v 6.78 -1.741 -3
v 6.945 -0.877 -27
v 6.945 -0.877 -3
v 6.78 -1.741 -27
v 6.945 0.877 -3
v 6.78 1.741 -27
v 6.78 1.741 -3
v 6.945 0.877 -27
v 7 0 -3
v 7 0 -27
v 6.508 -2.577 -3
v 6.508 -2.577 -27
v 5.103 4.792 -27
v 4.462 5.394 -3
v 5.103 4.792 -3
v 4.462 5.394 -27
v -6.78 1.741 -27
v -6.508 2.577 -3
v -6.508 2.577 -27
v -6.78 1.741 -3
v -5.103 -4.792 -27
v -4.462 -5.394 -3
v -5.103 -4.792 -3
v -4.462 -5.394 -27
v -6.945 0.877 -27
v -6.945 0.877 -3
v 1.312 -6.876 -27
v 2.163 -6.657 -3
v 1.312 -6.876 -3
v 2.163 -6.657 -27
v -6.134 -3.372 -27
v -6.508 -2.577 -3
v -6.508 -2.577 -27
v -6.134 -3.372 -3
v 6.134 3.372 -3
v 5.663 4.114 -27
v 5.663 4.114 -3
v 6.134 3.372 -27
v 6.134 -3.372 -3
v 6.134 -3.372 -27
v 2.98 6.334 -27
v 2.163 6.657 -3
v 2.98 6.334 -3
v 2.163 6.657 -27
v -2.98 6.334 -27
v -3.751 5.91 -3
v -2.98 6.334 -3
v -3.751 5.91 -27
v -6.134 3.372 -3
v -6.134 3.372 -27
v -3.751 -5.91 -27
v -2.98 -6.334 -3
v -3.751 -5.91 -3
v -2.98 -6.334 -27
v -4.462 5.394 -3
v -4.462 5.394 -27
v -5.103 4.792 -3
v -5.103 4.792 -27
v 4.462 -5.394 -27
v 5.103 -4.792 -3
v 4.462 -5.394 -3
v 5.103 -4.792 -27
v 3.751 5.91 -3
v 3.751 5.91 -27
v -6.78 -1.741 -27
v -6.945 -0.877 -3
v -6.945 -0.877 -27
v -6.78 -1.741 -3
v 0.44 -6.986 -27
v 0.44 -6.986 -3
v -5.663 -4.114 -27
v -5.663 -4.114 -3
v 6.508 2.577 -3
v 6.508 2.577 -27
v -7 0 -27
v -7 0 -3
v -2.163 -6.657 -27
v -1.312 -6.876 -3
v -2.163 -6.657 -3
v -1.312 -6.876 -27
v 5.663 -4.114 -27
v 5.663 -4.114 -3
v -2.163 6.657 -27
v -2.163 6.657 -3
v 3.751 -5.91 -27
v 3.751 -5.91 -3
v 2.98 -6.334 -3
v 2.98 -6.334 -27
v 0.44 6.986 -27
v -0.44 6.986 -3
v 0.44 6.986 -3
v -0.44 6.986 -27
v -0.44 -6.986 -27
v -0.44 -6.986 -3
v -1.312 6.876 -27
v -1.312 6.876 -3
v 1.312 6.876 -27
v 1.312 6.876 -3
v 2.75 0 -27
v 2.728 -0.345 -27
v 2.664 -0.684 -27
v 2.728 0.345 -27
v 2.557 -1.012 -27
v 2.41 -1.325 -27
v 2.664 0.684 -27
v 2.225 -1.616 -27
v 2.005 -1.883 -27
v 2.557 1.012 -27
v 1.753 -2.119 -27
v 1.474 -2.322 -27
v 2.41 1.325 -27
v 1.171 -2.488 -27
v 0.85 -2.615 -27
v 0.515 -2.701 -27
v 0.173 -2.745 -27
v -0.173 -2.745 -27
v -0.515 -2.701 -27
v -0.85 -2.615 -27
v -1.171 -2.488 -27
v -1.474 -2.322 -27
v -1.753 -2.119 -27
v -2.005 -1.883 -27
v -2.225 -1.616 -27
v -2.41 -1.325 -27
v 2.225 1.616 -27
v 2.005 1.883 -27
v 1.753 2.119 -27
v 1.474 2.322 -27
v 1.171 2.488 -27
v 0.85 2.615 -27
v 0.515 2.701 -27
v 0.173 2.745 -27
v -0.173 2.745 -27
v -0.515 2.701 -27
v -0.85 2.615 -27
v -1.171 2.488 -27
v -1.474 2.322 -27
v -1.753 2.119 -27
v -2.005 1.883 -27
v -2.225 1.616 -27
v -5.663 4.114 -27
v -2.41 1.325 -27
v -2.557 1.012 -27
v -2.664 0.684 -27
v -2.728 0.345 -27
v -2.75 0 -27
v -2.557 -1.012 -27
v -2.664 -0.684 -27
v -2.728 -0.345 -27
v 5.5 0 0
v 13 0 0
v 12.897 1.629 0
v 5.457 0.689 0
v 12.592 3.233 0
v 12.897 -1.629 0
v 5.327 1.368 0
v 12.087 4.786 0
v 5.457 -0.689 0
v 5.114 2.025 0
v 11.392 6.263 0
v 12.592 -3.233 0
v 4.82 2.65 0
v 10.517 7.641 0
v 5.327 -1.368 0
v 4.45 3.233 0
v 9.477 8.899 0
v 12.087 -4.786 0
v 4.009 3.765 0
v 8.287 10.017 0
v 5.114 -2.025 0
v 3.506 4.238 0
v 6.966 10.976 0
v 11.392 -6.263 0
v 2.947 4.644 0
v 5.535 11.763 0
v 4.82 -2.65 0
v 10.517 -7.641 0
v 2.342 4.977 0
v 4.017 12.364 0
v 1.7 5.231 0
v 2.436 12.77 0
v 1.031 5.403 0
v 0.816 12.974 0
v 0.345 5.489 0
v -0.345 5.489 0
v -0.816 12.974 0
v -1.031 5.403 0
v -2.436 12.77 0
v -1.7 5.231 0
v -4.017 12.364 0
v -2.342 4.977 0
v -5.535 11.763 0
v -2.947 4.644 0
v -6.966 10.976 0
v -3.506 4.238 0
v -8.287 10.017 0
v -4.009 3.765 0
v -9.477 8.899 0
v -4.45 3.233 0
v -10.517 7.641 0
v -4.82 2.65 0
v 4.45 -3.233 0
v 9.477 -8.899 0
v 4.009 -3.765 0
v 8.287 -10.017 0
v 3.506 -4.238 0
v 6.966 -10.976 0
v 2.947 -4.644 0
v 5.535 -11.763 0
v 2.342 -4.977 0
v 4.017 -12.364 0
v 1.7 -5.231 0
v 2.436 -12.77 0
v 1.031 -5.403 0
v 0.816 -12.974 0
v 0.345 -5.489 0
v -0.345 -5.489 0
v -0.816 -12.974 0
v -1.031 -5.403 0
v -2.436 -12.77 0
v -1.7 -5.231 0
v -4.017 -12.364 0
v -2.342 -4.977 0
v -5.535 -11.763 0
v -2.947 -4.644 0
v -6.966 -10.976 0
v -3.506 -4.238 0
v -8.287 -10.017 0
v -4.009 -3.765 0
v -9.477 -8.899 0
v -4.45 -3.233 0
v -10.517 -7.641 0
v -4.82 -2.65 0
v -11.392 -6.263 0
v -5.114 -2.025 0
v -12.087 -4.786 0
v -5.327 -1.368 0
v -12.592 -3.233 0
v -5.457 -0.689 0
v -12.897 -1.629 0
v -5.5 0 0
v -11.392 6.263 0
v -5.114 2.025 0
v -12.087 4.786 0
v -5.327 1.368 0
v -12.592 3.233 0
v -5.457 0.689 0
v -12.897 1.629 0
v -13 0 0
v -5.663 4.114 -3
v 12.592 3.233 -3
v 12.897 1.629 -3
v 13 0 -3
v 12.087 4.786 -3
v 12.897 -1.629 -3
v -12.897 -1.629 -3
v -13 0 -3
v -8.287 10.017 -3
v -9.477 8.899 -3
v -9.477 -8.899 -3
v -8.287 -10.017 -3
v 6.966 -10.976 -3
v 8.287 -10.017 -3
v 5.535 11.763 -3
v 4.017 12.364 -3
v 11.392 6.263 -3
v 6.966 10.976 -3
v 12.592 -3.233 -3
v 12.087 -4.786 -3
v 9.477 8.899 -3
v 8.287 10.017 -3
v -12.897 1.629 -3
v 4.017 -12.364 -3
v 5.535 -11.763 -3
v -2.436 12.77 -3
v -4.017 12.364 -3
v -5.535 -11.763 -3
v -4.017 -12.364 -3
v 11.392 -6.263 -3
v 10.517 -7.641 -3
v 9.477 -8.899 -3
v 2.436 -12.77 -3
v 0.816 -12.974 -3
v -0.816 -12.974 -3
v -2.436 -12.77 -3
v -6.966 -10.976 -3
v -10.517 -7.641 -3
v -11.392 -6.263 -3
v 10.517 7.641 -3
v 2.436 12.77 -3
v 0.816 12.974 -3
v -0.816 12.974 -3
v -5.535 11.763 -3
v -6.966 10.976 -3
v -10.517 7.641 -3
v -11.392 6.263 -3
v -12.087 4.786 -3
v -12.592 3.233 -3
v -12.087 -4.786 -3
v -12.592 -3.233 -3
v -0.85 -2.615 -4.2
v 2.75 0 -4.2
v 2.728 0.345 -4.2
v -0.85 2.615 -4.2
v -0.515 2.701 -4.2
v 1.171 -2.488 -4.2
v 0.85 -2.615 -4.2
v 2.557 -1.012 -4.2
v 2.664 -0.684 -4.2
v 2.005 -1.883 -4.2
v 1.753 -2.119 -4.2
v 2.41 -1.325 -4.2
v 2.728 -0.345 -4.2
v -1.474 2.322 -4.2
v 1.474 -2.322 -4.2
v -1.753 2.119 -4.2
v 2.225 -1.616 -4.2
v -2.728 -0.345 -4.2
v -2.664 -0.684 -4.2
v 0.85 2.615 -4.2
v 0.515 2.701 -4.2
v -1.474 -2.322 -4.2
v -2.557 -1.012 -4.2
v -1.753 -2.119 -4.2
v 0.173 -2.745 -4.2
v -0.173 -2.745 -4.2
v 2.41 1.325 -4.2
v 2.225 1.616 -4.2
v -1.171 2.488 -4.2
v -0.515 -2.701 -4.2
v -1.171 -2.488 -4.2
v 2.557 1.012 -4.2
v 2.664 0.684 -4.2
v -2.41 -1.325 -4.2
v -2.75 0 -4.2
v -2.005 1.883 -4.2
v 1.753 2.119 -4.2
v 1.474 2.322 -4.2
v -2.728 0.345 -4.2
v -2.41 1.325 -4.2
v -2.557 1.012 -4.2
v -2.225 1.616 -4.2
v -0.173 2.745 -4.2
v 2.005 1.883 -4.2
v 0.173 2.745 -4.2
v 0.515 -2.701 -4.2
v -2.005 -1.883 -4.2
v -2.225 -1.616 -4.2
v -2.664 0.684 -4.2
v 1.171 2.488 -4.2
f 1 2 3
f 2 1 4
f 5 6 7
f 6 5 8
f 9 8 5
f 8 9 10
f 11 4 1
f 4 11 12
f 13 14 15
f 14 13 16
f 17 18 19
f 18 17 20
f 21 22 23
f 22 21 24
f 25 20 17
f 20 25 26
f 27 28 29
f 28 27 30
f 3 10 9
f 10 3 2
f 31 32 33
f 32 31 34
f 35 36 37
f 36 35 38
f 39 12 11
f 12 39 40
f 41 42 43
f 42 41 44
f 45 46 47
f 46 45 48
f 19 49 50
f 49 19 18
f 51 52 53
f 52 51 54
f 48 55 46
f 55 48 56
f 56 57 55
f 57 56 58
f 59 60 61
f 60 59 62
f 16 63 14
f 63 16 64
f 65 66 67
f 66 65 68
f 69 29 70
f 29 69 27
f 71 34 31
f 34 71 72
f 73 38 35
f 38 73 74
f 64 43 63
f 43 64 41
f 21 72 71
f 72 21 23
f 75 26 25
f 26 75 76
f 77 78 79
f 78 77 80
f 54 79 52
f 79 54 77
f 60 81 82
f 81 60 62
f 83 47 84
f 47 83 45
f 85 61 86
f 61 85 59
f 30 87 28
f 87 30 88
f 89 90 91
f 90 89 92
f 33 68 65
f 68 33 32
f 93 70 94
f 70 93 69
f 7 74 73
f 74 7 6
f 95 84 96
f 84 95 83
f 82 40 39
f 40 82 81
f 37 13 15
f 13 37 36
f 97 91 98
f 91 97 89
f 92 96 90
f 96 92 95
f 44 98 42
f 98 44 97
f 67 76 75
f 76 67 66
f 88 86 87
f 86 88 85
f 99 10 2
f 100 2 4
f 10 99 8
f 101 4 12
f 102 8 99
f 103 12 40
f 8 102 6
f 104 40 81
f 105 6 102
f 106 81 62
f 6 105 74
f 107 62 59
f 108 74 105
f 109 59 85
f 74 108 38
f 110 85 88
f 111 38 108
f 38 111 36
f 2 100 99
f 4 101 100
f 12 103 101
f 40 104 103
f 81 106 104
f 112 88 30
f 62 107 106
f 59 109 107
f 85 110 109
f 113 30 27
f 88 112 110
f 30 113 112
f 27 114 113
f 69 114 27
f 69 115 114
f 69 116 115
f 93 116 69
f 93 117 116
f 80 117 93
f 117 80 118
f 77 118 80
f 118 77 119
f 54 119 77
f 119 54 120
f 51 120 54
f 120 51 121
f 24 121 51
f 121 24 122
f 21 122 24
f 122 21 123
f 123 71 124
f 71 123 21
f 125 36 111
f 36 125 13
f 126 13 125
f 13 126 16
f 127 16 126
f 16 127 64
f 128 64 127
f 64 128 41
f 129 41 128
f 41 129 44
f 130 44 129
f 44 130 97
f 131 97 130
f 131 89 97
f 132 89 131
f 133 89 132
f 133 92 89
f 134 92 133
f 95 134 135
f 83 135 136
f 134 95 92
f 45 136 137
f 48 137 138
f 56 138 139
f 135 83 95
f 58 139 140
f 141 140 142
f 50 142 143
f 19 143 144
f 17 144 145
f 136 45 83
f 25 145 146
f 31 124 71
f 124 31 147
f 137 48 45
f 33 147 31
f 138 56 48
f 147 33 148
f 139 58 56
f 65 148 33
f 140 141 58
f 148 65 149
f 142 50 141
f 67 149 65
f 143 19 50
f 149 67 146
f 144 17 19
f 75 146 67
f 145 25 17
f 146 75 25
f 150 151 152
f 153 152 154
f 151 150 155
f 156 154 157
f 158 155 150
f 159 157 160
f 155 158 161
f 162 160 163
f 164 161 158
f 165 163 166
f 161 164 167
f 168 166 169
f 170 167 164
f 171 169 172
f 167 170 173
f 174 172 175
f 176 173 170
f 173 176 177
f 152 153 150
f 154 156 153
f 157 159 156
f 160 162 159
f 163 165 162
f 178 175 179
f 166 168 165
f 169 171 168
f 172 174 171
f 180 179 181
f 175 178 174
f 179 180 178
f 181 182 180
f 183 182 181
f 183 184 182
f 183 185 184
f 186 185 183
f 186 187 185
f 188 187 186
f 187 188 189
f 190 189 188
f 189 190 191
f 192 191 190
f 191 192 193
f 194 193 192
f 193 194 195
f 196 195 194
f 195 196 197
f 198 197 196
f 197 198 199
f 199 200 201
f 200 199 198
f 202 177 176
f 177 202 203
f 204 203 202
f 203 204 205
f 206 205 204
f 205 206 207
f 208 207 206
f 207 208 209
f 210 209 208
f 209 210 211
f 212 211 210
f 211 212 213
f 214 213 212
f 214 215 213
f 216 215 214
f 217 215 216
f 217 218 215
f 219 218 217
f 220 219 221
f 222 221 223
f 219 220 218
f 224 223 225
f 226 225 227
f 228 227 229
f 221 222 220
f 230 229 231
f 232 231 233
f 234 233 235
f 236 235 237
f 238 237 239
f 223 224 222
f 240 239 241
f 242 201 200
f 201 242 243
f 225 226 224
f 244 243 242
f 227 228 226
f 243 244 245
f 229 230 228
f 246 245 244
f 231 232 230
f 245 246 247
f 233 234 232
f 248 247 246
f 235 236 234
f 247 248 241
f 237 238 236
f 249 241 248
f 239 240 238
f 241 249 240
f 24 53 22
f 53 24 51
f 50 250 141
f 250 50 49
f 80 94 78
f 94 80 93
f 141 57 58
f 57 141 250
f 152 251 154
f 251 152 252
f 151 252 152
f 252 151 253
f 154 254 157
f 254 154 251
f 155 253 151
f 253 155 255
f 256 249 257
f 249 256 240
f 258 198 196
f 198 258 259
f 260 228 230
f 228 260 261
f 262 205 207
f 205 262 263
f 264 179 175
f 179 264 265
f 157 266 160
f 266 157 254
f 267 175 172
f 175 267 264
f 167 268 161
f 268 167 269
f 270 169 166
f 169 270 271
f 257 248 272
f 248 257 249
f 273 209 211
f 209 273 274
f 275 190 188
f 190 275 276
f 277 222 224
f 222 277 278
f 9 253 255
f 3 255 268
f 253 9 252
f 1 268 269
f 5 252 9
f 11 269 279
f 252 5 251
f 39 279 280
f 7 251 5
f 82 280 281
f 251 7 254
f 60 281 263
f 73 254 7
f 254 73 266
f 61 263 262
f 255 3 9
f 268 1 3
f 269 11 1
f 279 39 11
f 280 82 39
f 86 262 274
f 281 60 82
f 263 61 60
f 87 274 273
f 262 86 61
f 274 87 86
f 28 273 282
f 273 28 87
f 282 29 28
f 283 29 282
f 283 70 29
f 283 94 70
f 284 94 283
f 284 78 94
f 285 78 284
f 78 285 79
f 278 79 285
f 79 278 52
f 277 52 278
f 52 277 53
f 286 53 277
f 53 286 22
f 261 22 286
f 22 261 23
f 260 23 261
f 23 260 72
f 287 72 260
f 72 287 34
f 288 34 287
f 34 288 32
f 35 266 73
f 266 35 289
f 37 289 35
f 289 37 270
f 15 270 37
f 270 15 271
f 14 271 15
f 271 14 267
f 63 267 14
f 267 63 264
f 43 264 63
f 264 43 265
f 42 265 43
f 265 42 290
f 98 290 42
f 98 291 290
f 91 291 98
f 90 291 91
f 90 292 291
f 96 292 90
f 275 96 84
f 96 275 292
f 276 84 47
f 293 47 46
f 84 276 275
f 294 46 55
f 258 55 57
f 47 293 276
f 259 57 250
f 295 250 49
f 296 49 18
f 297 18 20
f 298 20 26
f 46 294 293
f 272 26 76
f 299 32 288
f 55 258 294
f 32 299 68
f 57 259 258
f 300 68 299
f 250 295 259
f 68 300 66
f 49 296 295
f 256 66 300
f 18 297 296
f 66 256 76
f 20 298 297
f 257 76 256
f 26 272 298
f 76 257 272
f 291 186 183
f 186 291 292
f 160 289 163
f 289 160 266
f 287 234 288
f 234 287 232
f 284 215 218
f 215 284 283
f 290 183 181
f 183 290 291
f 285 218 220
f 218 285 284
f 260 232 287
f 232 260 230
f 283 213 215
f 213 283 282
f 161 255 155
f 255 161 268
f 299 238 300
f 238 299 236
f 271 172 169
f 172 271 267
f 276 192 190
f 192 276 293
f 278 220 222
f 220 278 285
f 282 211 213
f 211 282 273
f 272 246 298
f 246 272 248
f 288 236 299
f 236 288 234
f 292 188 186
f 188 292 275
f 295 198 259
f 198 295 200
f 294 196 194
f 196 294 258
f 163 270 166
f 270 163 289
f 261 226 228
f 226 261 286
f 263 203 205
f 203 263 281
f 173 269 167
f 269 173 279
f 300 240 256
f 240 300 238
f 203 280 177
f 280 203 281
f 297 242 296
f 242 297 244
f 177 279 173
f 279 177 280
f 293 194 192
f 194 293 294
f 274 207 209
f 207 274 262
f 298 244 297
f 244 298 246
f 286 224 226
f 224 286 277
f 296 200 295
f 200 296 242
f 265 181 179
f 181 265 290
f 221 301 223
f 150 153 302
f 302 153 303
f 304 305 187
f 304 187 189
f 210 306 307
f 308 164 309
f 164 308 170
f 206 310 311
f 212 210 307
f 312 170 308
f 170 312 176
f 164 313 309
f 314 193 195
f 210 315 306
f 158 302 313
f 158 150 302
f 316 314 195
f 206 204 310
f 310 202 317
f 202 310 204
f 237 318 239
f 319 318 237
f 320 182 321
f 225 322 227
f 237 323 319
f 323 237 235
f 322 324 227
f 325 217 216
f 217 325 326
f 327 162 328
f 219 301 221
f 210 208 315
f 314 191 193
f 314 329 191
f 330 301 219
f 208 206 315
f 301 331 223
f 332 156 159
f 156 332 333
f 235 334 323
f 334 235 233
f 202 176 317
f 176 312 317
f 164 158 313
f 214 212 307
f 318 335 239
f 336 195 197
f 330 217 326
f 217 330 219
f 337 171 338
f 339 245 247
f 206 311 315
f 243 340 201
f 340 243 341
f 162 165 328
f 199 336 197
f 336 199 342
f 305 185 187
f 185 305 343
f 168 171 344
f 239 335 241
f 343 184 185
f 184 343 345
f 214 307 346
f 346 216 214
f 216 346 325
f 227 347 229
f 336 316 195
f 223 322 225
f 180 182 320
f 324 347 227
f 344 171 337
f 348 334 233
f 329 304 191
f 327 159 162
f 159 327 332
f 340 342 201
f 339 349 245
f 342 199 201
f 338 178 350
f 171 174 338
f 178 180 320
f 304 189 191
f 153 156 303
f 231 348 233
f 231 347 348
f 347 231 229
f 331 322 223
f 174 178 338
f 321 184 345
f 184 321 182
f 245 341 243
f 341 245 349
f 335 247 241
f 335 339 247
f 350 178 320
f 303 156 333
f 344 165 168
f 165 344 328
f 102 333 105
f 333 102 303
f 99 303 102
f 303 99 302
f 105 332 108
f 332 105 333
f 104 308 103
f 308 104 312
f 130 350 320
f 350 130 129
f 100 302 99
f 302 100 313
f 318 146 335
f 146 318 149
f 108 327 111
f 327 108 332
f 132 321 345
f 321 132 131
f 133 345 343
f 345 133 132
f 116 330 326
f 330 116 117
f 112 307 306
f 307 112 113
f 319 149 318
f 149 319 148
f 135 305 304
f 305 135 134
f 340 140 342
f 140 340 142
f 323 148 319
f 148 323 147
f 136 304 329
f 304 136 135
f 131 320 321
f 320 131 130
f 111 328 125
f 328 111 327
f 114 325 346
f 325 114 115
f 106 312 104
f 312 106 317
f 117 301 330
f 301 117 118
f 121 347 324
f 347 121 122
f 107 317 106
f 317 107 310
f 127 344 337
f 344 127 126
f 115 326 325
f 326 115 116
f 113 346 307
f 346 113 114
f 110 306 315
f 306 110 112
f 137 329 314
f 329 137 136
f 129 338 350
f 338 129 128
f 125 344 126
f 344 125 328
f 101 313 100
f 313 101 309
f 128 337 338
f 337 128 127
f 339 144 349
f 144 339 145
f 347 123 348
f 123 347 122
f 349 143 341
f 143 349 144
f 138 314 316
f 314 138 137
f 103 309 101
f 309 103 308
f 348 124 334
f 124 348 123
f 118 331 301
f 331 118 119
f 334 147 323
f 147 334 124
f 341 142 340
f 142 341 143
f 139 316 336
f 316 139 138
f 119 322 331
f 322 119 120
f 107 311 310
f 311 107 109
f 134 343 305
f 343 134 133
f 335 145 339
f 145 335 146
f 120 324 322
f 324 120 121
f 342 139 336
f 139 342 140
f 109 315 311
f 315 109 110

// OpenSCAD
$fn = 50;


difference() {
	union() {
		translate(v = [0, 0, -27.0000000000]) {
			cylinder(h = 27, r = 7.0000000000);
		}
		translate(v = [0, 0, -3.0000000000]) {
			cylinder(h = 3, r = 13.0000000000);
		}
	}
	union() {
		translate(v = [0, 0, 0]) {
			rotate(a = [0, 0, 0]) {
				difference() {
					union() {
						#translate(v = [0, 0, -27.0000000000]) {
							cylinder(h = 27, r = 2.2500000000);
						}
						#translate(v = [0, 0, -4.2000000000]) {
							cylinder(h = 4.2000000000, r = 7.0000000000, r1 = 2.7500000000, r2 = 5.5000000000);
						}
						#translate(v = [0, 0, -27.0000000000]) {
							cylinder(h = 27, r = 2.7500000000);
						}
						#translate(v = [0, 0, -27.0000000000]) {
							cylinder(h = 27, r = 2.2500000000);
						}
					}
					union();
				}
			}
		}
	}
}
